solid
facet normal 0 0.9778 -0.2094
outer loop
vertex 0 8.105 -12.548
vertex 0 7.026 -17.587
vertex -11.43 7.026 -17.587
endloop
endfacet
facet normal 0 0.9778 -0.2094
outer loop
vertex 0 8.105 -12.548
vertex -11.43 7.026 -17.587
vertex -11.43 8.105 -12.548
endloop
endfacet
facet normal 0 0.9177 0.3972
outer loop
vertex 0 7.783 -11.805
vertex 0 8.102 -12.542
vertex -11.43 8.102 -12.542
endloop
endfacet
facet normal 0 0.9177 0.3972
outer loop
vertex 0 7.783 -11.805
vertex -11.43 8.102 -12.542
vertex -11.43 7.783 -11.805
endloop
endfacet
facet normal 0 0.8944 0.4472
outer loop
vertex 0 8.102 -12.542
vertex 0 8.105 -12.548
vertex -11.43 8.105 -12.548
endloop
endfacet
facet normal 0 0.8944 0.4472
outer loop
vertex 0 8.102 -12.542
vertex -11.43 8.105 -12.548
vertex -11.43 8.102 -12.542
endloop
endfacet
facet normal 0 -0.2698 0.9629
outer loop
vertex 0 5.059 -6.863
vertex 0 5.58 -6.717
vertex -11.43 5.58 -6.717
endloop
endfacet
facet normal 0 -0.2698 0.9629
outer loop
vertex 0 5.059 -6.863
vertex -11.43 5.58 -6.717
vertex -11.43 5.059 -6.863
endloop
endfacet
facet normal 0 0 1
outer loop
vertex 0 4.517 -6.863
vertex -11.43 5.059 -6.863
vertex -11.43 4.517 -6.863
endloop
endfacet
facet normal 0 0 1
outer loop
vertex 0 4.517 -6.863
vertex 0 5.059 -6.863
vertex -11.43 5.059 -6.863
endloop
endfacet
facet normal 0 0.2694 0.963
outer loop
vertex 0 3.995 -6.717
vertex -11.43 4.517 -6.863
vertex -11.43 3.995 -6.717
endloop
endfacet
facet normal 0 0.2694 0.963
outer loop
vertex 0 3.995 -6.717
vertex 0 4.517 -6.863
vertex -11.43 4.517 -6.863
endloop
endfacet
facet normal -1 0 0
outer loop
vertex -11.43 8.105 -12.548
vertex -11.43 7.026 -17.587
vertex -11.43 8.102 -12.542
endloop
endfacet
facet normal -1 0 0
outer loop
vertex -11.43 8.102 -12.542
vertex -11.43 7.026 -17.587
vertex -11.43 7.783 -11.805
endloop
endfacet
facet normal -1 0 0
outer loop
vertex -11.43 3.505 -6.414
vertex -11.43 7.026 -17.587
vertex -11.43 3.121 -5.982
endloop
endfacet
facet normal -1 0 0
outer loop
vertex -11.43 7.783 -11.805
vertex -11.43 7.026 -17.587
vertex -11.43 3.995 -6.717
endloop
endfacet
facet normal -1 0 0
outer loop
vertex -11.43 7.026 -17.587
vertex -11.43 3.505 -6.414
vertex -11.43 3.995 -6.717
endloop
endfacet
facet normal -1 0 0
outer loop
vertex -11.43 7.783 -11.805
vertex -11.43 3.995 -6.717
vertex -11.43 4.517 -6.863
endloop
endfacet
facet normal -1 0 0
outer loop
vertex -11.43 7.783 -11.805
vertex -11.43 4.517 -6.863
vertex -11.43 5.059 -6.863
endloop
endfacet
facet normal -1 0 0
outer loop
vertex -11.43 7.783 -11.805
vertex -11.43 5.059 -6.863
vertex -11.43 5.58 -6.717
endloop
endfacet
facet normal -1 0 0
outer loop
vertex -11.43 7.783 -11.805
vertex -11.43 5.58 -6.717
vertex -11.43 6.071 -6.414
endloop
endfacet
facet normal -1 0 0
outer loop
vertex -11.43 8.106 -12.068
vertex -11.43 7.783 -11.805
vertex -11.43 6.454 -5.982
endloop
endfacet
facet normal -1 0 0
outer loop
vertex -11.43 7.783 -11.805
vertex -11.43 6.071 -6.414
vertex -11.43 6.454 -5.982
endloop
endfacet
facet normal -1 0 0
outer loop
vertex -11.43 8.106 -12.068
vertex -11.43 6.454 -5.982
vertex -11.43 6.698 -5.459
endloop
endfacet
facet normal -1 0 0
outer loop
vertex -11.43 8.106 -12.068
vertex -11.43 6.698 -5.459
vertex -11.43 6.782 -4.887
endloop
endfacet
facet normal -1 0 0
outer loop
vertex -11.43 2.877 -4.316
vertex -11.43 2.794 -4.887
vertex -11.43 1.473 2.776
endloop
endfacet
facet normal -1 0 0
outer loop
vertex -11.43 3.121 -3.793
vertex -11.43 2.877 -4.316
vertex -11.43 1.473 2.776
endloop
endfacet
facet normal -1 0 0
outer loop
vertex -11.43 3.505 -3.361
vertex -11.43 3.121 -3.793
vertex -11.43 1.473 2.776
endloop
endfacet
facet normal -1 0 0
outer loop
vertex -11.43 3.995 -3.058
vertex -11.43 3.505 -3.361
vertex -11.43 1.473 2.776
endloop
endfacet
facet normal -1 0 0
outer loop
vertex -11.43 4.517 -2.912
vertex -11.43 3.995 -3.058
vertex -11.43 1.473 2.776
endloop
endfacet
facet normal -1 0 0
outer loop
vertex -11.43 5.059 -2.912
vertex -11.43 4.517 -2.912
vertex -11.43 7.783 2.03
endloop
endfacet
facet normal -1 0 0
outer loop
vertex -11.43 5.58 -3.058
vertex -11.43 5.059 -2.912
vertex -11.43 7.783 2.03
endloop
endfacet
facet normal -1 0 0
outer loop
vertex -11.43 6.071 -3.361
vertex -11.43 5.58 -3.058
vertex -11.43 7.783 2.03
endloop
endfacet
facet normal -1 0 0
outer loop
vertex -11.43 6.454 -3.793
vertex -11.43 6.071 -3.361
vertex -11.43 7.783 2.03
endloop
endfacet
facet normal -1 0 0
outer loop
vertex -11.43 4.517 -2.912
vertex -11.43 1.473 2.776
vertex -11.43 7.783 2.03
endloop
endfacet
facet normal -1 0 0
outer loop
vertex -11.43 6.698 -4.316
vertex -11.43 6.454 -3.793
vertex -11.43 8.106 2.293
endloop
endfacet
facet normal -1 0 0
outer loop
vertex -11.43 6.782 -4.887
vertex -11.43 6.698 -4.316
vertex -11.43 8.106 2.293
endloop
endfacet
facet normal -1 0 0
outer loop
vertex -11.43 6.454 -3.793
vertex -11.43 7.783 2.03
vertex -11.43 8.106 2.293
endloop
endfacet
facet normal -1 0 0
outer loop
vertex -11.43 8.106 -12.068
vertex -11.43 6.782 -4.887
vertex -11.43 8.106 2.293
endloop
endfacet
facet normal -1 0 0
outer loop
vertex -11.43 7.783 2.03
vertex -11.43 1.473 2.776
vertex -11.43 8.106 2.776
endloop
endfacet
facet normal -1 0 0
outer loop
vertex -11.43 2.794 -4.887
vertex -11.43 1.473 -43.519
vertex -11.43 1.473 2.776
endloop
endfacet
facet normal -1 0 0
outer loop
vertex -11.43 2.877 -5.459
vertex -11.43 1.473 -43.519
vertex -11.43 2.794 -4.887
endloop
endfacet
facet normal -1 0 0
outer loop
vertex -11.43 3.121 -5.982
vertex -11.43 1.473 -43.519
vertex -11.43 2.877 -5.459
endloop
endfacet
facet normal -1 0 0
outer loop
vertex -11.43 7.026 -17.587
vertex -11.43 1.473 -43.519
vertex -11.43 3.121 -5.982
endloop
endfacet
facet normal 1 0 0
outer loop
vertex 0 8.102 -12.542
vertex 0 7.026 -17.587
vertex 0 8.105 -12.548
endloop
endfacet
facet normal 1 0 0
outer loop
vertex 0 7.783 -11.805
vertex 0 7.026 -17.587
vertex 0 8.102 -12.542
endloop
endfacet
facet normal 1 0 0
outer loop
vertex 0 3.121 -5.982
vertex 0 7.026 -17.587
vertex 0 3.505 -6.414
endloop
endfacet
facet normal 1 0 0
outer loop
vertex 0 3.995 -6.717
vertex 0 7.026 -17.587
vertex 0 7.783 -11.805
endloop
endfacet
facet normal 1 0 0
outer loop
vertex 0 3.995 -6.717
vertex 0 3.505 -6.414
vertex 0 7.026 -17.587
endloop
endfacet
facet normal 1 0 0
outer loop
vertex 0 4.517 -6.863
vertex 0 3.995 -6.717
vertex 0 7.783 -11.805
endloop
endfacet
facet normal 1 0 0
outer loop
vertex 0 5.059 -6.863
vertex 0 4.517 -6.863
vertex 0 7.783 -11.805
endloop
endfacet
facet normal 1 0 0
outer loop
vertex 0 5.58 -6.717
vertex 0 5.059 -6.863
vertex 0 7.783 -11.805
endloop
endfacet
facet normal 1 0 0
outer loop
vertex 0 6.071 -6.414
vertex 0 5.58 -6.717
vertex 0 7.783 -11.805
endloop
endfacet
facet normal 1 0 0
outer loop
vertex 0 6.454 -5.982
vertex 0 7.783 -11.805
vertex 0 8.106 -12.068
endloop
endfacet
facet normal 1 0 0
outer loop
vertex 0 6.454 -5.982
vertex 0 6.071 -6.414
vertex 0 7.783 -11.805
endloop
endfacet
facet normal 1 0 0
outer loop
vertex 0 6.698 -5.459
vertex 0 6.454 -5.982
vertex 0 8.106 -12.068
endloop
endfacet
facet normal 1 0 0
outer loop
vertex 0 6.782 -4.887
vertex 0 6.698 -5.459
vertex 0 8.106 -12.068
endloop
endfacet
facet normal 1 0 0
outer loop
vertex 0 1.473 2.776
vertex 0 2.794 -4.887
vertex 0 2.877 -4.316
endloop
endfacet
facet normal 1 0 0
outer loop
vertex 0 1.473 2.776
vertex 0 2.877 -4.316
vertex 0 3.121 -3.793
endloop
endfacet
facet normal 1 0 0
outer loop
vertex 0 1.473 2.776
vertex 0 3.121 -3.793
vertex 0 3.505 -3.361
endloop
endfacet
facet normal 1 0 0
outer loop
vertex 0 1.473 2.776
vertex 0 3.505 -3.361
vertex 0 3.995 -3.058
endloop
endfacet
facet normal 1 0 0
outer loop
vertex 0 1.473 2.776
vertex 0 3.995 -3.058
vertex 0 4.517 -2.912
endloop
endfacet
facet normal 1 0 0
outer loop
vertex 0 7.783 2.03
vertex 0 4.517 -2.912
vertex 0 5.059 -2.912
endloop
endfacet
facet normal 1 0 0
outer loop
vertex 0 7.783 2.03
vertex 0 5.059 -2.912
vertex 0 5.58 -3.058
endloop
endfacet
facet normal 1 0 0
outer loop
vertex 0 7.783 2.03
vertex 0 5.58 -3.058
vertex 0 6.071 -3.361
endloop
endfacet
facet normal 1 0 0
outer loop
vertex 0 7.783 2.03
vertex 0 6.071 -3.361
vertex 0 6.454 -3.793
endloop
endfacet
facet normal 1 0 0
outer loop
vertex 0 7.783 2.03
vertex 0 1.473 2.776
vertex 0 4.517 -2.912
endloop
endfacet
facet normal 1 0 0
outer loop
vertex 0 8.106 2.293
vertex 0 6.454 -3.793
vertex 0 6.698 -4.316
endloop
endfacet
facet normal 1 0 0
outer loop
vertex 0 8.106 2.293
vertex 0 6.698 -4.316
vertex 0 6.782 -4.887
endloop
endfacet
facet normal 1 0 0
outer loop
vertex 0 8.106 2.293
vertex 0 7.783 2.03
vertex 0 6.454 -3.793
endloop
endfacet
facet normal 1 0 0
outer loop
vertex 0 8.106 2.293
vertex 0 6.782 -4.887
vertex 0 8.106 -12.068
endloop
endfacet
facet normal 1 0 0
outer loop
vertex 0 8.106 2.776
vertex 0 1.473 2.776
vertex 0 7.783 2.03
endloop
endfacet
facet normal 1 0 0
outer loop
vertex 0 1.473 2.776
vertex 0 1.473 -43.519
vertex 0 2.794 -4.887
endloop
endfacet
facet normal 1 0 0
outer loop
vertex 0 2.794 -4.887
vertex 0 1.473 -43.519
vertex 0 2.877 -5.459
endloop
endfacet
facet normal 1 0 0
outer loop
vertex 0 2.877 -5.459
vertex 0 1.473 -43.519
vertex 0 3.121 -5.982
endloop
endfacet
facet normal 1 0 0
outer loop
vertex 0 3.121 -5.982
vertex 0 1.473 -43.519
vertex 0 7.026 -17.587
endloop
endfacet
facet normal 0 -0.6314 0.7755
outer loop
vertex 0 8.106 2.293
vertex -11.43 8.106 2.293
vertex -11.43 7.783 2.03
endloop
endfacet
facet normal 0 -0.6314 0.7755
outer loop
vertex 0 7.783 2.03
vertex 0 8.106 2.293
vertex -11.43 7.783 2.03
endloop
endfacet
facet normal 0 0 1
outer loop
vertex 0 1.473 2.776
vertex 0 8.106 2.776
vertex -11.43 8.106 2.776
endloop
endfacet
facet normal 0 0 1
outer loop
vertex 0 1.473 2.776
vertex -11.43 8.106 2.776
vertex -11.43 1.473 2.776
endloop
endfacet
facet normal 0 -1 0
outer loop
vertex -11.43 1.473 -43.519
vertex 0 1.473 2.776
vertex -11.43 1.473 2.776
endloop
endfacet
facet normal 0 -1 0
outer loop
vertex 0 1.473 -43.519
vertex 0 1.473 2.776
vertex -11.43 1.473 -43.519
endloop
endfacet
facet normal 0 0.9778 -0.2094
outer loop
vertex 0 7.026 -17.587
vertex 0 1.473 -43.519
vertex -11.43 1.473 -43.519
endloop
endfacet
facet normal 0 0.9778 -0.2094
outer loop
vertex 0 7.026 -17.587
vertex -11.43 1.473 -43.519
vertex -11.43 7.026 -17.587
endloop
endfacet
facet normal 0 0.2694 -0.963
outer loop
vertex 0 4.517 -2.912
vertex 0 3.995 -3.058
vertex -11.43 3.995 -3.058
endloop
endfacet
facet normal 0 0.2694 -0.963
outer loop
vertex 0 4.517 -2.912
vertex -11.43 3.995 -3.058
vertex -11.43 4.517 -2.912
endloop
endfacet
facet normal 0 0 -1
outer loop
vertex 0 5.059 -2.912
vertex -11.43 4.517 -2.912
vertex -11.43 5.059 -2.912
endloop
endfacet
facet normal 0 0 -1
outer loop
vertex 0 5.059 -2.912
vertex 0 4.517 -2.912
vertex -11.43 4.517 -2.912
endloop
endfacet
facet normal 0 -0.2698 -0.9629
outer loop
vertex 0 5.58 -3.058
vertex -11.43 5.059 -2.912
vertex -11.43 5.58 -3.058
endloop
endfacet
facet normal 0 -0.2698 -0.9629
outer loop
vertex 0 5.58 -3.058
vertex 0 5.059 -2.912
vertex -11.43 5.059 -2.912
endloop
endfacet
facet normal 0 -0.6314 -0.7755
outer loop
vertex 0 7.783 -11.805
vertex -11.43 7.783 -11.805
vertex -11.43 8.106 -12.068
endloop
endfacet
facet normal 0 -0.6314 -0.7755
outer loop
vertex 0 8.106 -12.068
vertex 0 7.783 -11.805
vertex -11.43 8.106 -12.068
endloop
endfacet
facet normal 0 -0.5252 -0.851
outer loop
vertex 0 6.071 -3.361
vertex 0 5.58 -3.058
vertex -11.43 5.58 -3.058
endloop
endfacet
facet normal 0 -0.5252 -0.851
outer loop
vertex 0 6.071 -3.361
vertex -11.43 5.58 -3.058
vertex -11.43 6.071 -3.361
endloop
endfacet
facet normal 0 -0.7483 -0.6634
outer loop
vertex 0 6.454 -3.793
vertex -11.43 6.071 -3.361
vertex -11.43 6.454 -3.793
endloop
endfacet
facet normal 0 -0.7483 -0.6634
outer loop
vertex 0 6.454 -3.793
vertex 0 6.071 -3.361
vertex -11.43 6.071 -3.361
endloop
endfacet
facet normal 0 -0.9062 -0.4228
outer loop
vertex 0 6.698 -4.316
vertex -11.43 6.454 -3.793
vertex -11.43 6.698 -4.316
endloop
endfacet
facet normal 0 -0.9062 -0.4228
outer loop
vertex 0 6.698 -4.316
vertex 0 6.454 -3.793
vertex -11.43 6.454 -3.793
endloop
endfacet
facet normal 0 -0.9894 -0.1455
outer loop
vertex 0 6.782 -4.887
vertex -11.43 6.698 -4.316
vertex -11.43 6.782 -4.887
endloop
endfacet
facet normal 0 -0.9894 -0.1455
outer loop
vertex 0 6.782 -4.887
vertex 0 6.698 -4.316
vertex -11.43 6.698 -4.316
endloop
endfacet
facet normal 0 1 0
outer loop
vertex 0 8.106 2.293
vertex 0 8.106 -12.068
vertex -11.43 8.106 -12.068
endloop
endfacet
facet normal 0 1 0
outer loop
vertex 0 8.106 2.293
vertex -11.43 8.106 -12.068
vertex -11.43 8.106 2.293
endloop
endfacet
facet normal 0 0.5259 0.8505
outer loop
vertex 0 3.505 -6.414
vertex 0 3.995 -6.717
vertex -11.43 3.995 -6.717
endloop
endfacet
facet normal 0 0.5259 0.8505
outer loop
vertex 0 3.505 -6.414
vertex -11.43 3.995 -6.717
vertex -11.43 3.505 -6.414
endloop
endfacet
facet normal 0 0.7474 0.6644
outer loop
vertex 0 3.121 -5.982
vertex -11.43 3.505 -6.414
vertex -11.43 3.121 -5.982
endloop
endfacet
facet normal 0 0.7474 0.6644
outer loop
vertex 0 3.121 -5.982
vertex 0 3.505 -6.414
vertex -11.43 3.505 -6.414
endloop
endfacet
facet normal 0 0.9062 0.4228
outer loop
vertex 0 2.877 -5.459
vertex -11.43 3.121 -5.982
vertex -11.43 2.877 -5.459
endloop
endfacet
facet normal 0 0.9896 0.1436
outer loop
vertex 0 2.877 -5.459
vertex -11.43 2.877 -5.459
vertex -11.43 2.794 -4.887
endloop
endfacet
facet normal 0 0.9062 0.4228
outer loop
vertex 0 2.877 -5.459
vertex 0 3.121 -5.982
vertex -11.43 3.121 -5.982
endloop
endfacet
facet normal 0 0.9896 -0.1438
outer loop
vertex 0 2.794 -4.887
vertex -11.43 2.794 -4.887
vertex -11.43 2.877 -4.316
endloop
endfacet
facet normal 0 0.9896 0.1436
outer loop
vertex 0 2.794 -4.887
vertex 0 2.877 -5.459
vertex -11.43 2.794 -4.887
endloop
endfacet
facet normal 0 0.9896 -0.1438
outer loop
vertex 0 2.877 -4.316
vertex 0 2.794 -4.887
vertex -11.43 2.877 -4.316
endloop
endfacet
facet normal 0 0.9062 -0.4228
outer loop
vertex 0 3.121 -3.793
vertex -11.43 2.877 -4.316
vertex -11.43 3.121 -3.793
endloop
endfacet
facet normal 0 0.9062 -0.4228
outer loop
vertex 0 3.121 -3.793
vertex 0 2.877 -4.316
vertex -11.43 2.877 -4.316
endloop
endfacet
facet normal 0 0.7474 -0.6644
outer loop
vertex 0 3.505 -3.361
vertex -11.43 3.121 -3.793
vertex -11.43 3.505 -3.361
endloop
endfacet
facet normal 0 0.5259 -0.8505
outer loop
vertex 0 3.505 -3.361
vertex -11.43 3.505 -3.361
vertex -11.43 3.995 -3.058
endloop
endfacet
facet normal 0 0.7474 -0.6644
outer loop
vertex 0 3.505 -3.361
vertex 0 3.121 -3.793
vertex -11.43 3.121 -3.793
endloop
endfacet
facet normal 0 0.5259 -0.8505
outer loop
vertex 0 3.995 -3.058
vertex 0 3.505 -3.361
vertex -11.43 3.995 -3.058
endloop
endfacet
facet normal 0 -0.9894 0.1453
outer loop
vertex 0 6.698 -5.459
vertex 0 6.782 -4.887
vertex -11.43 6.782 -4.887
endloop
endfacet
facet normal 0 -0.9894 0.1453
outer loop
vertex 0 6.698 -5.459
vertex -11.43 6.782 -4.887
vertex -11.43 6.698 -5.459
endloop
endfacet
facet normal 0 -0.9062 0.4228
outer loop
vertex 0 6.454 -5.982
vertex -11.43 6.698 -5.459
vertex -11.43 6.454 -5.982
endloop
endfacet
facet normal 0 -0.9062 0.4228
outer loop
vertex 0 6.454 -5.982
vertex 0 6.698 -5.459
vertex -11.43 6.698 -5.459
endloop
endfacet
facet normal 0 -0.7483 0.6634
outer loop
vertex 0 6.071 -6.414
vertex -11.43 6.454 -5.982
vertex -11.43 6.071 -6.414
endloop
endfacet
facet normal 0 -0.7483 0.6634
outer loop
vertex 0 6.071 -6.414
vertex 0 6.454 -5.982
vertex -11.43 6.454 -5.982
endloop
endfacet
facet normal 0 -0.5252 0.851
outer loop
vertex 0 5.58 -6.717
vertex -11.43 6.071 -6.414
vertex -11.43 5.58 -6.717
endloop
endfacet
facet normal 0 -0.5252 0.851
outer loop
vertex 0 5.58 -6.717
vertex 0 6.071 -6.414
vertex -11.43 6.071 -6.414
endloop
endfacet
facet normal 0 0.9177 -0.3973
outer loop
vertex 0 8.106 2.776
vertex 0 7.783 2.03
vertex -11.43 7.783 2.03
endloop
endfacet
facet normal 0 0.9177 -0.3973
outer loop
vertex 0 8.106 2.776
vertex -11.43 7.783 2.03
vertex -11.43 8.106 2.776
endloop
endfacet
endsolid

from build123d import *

# Parameters (mm, degrees)
F1_DEPTH = 11.43


with BuildPart() as f1:
    # F0 (on Right) → F1 (new body)
    with BuildSketch(Plane.YZ):
        Polygon((3.3542175311, -1.5767664933), (1.4732253194, 2.7673263745), (1.4732253194, -3.1085191088), align=None)
        Polygon((7.7828650435, 2.029623989), (8.1059029485, 2.775669959), (1.4732253194, 2.775669959), (1.4732253194, 2.7673263745), (3.3542175311, -1.5767664933), align=None)
        with BuildLine():
            Line((8.1059029485, -12.0676500307), (8.1059029485, 2.2926841722))
            Line((8.1059029485, 2.2926841722), (7.7828650435, 2.029623989))
            Line((7.7828650435, 2.029623989), (5.5800336964, -3.0577463276))
            ThreePointArc((5.5800336964, -3.0577463276), (6.4543945145, -3.7929697506), (6.7816577479, -4.8874829292))
            ThreePointArc((6.7816577479, -4.8874829292), (6.4543945145, -5.9819961078), (5.5800336964, -6.7172195309))
            Line((5.5800336964, -6.7172195309), (7.7828650435, -11.8045898475))
            Line((7.7828650435, -11.8045898475), (8.1059029485, -12.0676500307))
        make_face()
        Polygon((1.4732253194, -12.5422922329), (8.1022901764, -12.5422922329), (7.7828650435, -11.8045898475), (3.3542175311, -8.1981993651), align=None)
        Polygon((3.3542175311, -8.1981993651), (1.4732253194, -6.6664467497), (1.4732253194, -12.5422922329), align=None)
        with BuildLine():
            Line((3.3542175311, -8.1981993651), (7.7828650435, -11.8045898475))
            Line((7.7828650435, -11.8045898475), (5.5800336964, -6.7172195309))
            ThreePointArc((5.5800336964, -6.7172195309), (4.7877577479, -6.8813829292), (3.9954817993, -6.7172195309))
            Line((3.9954817993, -6.7172195309), (3.3542175311, -8.1981993651))
        make_face()
        with BuildLine():
            Line((1.4732253194, -3.1085191088), (1.4732253194, -6.6664467497))
            Line((1.4732253194, -6.6664467497), (3.3542175311, -8.1981993651))
            Line((3.3542175311, -8.1981993651), (3.9954817993, -6.7172195309))
            ThreePointArc((3.9954817993, -6.7172195309), (2.7938577479, -4.8874829292), (3.9954817993, -3.0577463276))
            Line((3.9954817993, -3.0577463276), (3.3542175311, -1.5767664933))
            Line((3.3542175311, -1.5767664933), (1.4732253194, -3.1085191088))
        make_face()
        with BuildLine():
            Line((5.5800336964, -3.0577463276), (7.7828650435, 2.029623989))
            Line((7.7828650435, 2.029623989), (3.3542175311, -1.5767664933))
            Line((3.3542175311, -1.5767664933), (3.9954817993, -3.0577463276))
            ThreePointArc((3.9954817993, -3.0577463276), (4.7877577479, -2.8935829292), (5.5800336964, -3.0577463276))
        make_face()
        Polygon((1.4732253194, -43.5194037855), (7.0256497619, -17.5874829292), (1.4732253194, -17.5874829292), align=None)
        Polygon((1.4732253194, -17.5874829292), (7.0256497619, -17.5874829292), (8.1047075663, -12.5478751196), (8.1022901764, -12.5422922329), (1.4732253194, -12.5422922329), align=None)
    extrude(amount=-F1_DEPTH)


solid = f1.part
